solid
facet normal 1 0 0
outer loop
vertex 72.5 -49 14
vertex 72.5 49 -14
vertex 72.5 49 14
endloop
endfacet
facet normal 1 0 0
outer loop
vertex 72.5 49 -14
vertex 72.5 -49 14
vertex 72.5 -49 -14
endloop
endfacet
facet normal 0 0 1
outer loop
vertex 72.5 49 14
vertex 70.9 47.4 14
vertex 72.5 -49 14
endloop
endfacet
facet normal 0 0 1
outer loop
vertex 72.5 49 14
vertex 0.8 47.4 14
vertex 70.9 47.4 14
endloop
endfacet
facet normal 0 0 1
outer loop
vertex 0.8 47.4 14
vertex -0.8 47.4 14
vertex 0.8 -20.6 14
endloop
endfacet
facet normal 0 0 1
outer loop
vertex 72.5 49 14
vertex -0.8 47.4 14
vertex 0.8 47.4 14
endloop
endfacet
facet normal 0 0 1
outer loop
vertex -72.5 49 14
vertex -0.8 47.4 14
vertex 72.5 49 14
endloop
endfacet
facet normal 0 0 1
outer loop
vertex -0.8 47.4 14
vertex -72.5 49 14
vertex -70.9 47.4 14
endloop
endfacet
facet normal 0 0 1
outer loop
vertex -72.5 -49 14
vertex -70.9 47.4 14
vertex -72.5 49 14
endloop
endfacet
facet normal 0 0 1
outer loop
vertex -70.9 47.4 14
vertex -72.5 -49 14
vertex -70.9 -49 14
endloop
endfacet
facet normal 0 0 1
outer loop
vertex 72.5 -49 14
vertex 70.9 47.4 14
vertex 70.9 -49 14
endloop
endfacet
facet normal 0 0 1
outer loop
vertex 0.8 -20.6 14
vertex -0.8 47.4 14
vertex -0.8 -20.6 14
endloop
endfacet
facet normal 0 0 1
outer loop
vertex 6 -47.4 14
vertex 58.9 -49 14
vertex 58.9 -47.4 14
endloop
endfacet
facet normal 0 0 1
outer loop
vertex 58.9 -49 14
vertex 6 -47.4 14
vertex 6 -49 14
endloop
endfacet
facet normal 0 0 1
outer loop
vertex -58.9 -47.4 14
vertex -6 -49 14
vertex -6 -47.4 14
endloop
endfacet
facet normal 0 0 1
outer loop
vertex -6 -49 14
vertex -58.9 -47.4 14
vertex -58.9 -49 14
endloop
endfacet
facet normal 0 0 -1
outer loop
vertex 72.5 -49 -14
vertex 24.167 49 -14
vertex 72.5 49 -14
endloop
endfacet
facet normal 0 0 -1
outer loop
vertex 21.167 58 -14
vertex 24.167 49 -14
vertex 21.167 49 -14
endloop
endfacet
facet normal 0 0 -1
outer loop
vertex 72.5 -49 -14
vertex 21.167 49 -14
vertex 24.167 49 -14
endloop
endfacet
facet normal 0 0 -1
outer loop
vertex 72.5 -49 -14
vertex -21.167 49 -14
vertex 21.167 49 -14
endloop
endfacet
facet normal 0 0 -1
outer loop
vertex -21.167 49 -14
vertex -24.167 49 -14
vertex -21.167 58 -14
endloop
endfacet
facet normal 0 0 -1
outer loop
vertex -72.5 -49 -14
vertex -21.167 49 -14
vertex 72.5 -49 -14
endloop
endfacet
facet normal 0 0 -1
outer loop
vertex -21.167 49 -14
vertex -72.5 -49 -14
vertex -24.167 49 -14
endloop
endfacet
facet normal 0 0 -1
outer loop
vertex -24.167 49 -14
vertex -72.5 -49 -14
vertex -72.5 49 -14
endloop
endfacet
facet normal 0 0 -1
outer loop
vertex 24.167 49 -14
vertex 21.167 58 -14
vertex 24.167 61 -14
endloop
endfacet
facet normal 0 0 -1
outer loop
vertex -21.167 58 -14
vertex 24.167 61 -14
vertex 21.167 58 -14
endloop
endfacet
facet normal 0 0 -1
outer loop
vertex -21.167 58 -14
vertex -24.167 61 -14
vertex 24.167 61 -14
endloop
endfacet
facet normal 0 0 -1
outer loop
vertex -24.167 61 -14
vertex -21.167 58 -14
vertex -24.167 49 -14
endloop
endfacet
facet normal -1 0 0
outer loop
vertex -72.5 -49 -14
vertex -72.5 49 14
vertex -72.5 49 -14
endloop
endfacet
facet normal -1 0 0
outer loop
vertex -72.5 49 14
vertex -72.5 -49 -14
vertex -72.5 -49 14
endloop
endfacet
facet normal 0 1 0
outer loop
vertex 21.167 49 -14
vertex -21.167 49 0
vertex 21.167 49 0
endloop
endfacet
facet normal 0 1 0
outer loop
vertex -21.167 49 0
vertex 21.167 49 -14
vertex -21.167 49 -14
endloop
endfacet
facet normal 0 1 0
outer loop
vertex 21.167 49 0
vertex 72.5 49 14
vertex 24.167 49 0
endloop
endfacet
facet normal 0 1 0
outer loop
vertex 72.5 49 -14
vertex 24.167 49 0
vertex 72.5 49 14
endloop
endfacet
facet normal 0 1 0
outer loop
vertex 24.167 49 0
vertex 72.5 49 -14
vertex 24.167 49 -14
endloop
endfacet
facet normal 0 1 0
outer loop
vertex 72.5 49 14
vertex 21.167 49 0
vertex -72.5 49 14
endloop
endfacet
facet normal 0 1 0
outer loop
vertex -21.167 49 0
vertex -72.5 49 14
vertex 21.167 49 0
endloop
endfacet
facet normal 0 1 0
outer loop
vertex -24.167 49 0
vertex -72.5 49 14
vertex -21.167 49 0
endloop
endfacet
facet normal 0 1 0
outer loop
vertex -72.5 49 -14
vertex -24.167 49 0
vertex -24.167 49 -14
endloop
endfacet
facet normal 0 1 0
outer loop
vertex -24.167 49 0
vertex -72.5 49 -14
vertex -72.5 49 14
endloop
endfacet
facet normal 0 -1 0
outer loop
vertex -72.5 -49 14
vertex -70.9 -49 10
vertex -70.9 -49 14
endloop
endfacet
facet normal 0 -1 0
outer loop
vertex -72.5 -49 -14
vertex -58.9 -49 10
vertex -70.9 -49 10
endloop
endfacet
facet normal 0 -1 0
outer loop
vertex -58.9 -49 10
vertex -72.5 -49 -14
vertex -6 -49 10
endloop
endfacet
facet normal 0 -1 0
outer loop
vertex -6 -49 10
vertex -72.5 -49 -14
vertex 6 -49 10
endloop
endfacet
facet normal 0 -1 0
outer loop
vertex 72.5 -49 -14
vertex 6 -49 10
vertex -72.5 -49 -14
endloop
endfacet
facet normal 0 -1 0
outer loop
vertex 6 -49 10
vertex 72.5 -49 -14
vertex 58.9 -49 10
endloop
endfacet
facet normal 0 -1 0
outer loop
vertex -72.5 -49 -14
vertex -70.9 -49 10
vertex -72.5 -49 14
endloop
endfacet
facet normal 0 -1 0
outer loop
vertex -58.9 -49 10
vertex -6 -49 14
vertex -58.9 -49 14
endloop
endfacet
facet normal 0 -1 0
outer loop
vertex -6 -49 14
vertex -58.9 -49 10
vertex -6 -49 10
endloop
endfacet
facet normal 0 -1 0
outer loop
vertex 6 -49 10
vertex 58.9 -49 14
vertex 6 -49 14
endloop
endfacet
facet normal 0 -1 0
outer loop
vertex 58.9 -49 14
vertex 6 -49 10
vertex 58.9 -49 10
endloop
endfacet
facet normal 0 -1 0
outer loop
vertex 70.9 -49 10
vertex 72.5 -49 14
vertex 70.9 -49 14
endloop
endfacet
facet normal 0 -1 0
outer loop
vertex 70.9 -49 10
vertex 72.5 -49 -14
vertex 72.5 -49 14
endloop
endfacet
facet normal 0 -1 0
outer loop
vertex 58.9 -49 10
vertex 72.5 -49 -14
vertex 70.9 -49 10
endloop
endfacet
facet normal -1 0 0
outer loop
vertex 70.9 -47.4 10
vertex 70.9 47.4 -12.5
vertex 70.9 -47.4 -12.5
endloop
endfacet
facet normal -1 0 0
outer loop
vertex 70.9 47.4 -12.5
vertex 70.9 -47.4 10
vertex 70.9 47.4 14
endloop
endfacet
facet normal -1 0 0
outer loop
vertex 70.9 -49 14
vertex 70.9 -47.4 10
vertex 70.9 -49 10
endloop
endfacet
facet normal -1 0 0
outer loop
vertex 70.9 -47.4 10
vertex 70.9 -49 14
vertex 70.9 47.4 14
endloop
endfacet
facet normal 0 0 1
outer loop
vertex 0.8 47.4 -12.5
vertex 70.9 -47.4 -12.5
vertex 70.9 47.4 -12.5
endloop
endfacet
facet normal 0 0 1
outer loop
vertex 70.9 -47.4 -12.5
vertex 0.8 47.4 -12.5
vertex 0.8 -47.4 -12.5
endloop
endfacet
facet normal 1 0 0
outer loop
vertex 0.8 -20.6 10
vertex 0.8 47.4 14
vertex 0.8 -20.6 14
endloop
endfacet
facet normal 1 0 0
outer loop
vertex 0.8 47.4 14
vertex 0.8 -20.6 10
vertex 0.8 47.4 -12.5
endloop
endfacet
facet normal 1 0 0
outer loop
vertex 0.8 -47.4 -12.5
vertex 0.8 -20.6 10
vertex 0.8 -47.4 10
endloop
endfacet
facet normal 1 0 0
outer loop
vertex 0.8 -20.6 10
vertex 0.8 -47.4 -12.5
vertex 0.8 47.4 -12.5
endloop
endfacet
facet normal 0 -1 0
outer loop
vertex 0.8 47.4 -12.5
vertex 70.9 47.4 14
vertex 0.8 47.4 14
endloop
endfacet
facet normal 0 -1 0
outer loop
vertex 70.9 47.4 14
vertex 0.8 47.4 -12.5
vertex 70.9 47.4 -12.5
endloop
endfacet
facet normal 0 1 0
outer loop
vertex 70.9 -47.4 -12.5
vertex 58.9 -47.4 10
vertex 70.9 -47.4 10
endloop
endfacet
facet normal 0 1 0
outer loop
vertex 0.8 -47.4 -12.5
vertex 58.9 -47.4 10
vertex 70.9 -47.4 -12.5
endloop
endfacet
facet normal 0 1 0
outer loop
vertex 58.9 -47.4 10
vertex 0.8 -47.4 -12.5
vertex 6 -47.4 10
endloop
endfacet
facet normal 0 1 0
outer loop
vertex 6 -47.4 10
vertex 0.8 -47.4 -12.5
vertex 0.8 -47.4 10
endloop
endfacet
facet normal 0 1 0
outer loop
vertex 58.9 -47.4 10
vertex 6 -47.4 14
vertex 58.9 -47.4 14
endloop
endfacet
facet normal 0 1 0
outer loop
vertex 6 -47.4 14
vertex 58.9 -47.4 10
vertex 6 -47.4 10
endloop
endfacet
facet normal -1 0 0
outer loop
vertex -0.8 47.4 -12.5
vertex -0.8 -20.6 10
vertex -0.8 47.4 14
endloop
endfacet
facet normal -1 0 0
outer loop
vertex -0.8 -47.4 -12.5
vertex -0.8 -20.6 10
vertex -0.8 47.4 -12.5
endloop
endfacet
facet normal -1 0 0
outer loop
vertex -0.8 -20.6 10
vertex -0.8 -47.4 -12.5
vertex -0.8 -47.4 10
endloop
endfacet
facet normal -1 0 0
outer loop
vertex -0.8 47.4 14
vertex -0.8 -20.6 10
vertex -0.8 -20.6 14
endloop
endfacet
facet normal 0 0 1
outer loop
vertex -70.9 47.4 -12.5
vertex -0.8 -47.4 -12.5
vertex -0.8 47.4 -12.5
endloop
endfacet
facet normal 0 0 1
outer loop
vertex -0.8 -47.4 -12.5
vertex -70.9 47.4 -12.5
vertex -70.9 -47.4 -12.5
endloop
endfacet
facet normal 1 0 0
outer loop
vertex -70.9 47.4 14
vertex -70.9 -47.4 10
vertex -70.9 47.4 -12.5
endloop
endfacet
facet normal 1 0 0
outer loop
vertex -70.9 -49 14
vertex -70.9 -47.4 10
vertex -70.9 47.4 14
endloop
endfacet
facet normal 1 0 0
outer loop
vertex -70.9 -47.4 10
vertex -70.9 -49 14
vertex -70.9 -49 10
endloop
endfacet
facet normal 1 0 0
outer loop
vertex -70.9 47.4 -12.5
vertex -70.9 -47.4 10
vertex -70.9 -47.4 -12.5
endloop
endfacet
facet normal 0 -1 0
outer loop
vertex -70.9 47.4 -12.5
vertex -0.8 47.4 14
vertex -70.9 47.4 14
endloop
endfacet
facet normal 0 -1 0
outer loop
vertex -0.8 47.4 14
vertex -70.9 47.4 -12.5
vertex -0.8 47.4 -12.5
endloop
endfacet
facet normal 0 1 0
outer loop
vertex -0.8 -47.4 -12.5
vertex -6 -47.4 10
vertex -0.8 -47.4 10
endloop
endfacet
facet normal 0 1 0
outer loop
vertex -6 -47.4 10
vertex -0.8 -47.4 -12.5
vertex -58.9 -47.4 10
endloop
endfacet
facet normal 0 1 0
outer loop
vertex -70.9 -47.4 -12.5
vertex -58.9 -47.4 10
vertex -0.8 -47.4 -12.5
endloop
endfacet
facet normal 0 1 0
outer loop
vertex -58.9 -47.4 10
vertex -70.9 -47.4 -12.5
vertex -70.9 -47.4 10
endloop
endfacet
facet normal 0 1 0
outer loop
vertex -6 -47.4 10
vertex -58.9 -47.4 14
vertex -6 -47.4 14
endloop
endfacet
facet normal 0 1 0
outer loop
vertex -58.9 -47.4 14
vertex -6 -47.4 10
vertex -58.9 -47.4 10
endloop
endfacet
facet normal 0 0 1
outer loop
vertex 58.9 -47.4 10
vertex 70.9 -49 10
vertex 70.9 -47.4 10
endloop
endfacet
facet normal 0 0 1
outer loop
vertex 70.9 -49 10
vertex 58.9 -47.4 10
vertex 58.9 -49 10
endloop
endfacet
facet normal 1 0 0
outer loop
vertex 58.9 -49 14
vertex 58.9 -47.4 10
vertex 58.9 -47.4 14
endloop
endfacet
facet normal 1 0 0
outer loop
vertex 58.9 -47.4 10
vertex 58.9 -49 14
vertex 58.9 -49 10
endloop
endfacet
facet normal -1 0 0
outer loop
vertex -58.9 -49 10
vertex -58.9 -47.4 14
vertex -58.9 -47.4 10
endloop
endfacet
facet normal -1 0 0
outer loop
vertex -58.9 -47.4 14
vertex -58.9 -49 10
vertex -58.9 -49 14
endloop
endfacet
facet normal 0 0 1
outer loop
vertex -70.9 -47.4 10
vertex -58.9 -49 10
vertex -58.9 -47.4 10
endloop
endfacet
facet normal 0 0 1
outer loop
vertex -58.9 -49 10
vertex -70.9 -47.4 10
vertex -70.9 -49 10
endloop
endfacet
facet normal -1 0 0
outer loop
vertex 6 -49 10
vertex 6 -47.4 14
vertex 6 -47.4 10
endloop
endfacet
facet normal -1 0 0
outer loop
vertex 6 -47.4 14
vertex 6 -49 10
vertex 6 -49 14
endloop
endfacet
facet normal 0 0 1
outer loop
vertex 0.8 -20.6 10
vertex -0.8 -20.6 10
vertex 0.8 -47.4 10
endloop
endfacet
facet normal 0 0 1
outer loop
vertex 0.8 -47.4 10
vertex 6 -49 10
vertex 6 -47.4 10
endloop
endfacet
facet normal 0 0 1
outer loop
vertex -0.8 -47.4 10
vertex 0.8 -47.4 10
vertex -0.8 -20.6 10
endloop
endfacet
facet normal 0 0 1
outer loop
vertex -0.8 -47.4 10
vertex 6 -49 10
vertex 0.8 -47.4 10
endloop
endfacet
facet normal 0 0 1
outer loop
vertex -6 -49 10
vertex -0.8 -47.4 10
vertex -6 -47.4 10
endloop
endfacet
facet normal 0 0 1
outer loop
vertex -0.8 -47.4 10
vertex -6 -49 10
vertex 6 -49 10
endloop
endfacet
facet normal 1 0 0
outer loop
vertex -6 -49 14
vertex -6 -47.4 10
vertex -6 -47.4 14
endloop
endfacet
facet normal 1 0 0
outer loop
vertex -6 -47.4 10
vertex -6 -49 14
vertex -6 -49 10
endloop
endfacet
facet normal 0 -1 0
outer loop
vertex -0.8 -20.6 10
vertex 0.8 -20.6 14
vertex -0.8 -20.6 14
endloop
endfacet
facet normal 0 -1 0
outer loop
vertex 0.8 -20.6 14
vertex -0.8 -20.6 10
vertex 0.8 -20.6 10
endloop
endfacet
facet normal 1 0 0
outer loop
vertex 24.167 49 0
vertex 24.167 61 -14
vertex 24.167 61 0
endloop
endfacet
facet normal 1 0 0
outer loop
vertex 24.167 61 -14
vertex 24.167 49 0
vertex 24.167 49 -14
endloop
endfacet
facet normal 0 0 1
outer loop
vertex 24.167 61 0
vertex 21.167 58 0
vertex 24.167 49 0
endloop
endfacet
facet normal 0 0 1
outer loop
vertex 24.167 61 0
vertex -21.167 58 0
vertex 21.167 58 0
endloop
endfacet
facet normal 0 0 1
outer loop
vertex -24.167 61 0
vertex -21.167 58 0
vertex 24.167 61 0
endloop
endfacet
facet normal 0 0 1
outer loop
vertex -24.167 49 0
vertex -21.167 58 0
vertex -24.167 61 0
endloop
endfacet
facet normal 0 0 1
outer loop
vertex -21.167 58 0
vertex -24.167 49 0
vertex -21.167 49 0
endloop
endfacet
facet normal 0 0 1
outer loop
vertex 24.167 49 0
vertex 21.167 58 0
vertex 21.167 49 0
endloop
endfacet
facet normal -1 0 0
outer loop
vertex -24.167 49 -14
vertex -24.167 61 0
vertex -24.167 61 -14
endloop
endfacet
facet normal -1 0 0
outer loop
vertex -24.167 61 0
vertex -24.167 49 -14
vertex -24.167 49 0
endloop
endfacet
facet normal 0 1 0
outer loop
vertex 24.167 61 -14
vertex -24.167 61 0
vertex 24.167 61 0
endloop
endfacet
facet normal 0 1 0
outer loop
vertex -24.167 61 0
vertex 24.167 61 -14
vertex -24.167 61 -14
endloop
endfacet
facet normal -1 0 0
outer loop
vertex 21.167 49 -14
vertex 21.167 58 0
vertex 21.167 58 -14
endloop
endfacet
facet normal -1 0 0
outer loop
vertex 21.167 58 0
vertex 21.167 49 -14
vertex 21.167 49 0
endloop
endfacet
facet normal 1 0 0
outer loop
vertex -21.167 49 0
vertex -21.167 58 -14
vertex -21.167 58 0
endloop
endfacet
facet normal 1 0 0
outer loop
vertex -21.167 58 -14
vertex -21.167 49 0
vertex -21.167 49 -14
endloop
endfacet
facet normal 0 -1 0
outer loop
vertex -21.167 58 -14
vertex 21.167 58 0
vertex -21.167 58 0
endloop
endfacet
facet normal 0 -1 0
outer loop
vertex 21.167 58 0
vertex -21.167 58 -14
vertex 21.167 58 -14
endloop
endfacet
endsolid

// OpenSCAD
//---------------------------------------------------------------
//-- Another compartment box, by Obijuan  (Juan Gonzalez-Gomez)
//-- (c) April, 2013
//---------------------------------------------------------------
//-- Released under the GPL license
//---------------------------------------------------------------
//-- It is a design derived from:
//--   http://www.thingiverse.com/thing:15802  by ttsalo
//---------------------------------------------------------------

X = 0;
Y = 1;
Z = 2;

//-- Drawer parameters
drawer_size = [145, 98, 28];
drawer_bottom_th = 1.5;
drawer_wall_th = 1.6;

//-- Cabinet parameters -------------------------------

//-- Rhombus parameters
alpha = 60;    //-- Rhombus Side angle
rx = 8;        //-- Rhombus x length

cab_size = [150, 100, 95];
cab_th = 2;


//-- Handle parameters
handle_size = [drawer_size[X]/3, 12, drawer_size[Z]/2];
handle_th = 3;

//---------------------------------
//-- A rhombus
//---------------------------------
module rhombus(ang=60, rx=20, h=3)
{

  x = rx/2;
  y = x*tan(ang);

  translate([0, 0, -h/2])
  linear_extrude(height=h)
  polygon([[-x,0], [0,y], [x,0], [0, -y]]);
}

//--------------------------------------
//-- A mosaic of rhombus
//-- INPUTS:
//--   L = x length of the area
//--   H = y length of the area
//--   rx: rhombus x length
//--   alpha: rhombus side angle
//--   rth: rhombus thickness
//--------------------------------------
module mosaic(L, H, rx, alpha, rth)
{

  //-- x distance between two adjacent rhombuses
  l = rx+6;

  //-- y distance between two rows of rhombuses
  h = l/2 * tan(alpha);

  //-- Calculate the number of rhombuses along the x and y axis
  nrx = round((L-l/2)/l);
  nry = round((H-h)/h);

  //-- Calculate the dimension of the mosaic, according to the
  //-- number of rhombuses (columns and rows)
  H2 = h * (nry-1);
  L2 = (nrx-1) * l + rx;

  //-- Draw the mosaic
  color("green")
  translate([-L2/2 + rx/2, -H2/2, 0])  //-- center the mosaic
  for (j=[0:nry-1]) {  //-- Rows...

    for (i=[0:nrx-1-(j%2)]) {  //-- Columns
      translate([i*l + (j%2)*l/2 ,j*h,0])
        rhombus(alpha,rx, rth);
    }
  }
}

module cabinet()
{
  inner = [cab_size[X] - 2*cab_th, cab_size[Y], cab_size[Z] - 2*cab_th];

  union() {


  difference() {

    //-- Main cabinet
    cube(cab_size, center= true);

    //-- Inner room
    translate([0, cab_th, 0])
    cube(inner, center=true);
    
    // agujero tornillo
    union(){
      translate([cab_size[X]/2-6,cab_size[Y]/2-6,0])
      cylinder(h=2*cab_size[Z], r=1.7); 
      translate(-1*[cab_size[X]/2-6,cab_size[Y]/2-6,0])
      cylinder(h=2*cab_size[Z], r=1.7); 
      translate([cab_size[X]/2-6,-cab_size[Y]/2+6,0])
      cylinder(h=2*cab_size[Z], r=1.7); 
      translate(-[cab_size[X]/2-6,-cab_size[Y]/2+6,0])
      cylinder(h=2*cab_size[Z], r=1.7); 
    }

    //-- Top and bottom mosaics
    mosaic(L = cab_size[X], 
           H = cab_size[Y], 
           rx = rx, 
           alpha = alpha, 
           rth = cab_size[Z]+10);

     //-- Left and right mosaics
     rotate([0, 90, 0])
       mosaic(L = cab_size[Z], 
              H = cab_size[Y], 
              rx = rx, 
              alpha = alpha, 
              rth = cab_size[X] + 10);

     //-- Rear cutout
     translate([0, -cab_size[Y]/2, 0])
       cube([cab_size[X]-30, 10, cab_size[Z]-30], center=true);
  }

  //-- side rails
  translate([10/2 - cab_size[X]/2, 0, cab_size[Z]/6])
    cube([10, cab_size[Y], cab_th], center=true);

  translate([-10/2 + cab_size[X]/2, 0, cab_size[Z]/6])
    cube([10, cab_size[Y], cab_th], center=true);
 
  translate([10/2 - cab_size[X]/2, 0, -cab_size[Z]/6])
    cube([10, cab_size[Y], cab_th], center=true);

  translate([-10/2 + cab_size[X]/2, 0, -cab_size[Z]/6])
    cube([10, cab_size[Y], cab_th], center=true);   
    
  }
}



module handle()
{
  extra = 2;
  handle_co_size = [handle_size[X]-2*handle_th, handle_size[Y], handle_size[Z] + extra ];

   translate([0, handle_size[Y]/2 + drawer_size[Y]/2 , -handle_size[Z]/2]) 
    difference() {
      cube(handle_size, center=true);
      translate([0, -handle_th, 0])
        cube(handle_co_size, center=true);
    }
}

module drawer_4x4()
{
  comp_4x4_size = [drawer_size[X]/2 - drawer_wall_th - drawer_wall_th/2,
                   drawer_size[Y]/2 - drawer_wall_th - drawer_wall_th/2,
                   drawer_size[Z] ];

  xc = drawer_wall_th/2 + comp_4x4_size[X]/2;
  yc = drawer_wall_th/2 + comp_4x4_size[Y]/2;

  difference() {
    cube(drawer_size, center = true);   

    translate([xc, yc, drawer_bottom_th])
      cube(comp_4x4_size, center=true);
    
    translate([-xc, yc, drawer_bottom_th])
      cube(comp_4x4_size, center=true);
    
    translate([-xc, -yc, drawer_bottom_th])
      cube(comp_4x4_size, center=true);  
    
    translate([xc, -yc, drawer_bottom_th])
      cube(comp_4x4_size, center=true);
  }

  handle();

}

module drawer_4x4_agu()
{
  comp_4x4_size = [drawer_size[X]/2 - drawer_wall_th - drawer_wall_th/2,
                   drawer_size[Y]/2 - drawer_wall_th - drawer_wall_th/2,
                   drawer_size[Z] ];

  xc = drawer_wall_th/2 + comp_4x4_size[X]/2;
  yc = drawer_wall_th/2 + comp_4x4_size[Y]/2;

  difference() {
    cube(drawer_size, center = true);   

    translate([xc, yc, drawer_bottom_th])
      cube(comp_4x4_size, center=true);
    
    translate([-xc, yc, drawer_bottom_th])
      cube(comp_4x4_size, center=true);
    
    translate([-xc, -yc, drawer_bottom_th])
      cube(comp_4x4_size, center=true);  
    
    translate([xc, -yc, drawer_bottom_th])
      cube(comp_4x4_size, center=true);

    // Agujeros para los tornillos
    translate([drawer_size[X]/2-12-drawer_wall_th,-drawer_size[Y],drawer_size[Z]/2-4])
    cube([12,drawer_size[Y]/2,4]);
    translate([-drawer_size[X]/2+drawer_wall_th,-drawer_size[Y],drawer_size[Z]/2-4])
    cube([12,drawer_size[Y],4]);           
      
  }

  handle();

}

module drawer_2x1()
{
  comp_2x1_size = [drawer_size[X]/2 - drawer_wall_th - drawer_wall_th/2,
                   drawer_size[Y] - 2*drawer_wall_th,
                   drawer_size[Z] ];

  xc = drawer_wall_th/2 + comp_2x1_size[X]/2;

  difference() {
    cube(drawer_size, center = true);   

    translate([xc, 0, drawer_bottom_th])
      cube(comp_2x1_size, center=true);
    
    translate([-xc, 0, drawer_bottom_th])
      cube(comp_2x1_size, center=true);
    
  }

  handle();
}

module drawer_2x1_agu()
{
  comp_2x1_size = [drawer_size[X]/2 - drawer_wall_th - drawer_wall_th/2,
                   drawer_size[Y] - 2*drawer_wall_th,
                   drawer_size[Z] ];

  xc = drawer_wall_th/2 + comp_2x1_size[X]/2;
  


  difference() {
    cube(drawer_size, center = true);   

    translate([xc, 0, drawer_bottom_th])
      cube(comp_2x1_size, center=true);
    
    translate([-xc, 0, drawer_bottom_th])
      cube(comp_2x1_size, center=true);
      
    // Agujeros para los tornillos
    translate([drawer_size[X]/2-12-drawer_wall_th,-drawer_size[Y],drawer_size[Z]/2-4])
    cube([12,drawer_size[Y],4]);
    translate([-drawer_size[X]/2+drawer_wall_th,-drawer_size[Y],drawer_size[Z]/2-4])
    cube([12,drawer_size[Y],4]);     
    translate([-6,-drawer_size[Y]/2-drawer_wall_th,drawer_size[Z]/2-4])
    cube([12,30,4]);
    
  }

  handle();
}



module drawer_1x1()
{
  comp_1x1_size = [drawer_size[X] - 2*drawer_wall_th,
                   drawer_size[Y] - 2*drawer_wall_th,
                   drawer_size[Z] ];

  difference() {
    cube(drawer_size, center = true);   

    translate([0, 0, drawer_bottom_th])
      cube(comp_1x1_size, center=true);
    
  }

  handle();
}

//-- Uncomment the part you want to generate

//drawer_4x4_agu();
drawer_2x1_agu();
//drawer_1x1();

//--- Cabinet
//-- rotation, for making it printable
//rotate([90,0,0])
//  cabinet();
